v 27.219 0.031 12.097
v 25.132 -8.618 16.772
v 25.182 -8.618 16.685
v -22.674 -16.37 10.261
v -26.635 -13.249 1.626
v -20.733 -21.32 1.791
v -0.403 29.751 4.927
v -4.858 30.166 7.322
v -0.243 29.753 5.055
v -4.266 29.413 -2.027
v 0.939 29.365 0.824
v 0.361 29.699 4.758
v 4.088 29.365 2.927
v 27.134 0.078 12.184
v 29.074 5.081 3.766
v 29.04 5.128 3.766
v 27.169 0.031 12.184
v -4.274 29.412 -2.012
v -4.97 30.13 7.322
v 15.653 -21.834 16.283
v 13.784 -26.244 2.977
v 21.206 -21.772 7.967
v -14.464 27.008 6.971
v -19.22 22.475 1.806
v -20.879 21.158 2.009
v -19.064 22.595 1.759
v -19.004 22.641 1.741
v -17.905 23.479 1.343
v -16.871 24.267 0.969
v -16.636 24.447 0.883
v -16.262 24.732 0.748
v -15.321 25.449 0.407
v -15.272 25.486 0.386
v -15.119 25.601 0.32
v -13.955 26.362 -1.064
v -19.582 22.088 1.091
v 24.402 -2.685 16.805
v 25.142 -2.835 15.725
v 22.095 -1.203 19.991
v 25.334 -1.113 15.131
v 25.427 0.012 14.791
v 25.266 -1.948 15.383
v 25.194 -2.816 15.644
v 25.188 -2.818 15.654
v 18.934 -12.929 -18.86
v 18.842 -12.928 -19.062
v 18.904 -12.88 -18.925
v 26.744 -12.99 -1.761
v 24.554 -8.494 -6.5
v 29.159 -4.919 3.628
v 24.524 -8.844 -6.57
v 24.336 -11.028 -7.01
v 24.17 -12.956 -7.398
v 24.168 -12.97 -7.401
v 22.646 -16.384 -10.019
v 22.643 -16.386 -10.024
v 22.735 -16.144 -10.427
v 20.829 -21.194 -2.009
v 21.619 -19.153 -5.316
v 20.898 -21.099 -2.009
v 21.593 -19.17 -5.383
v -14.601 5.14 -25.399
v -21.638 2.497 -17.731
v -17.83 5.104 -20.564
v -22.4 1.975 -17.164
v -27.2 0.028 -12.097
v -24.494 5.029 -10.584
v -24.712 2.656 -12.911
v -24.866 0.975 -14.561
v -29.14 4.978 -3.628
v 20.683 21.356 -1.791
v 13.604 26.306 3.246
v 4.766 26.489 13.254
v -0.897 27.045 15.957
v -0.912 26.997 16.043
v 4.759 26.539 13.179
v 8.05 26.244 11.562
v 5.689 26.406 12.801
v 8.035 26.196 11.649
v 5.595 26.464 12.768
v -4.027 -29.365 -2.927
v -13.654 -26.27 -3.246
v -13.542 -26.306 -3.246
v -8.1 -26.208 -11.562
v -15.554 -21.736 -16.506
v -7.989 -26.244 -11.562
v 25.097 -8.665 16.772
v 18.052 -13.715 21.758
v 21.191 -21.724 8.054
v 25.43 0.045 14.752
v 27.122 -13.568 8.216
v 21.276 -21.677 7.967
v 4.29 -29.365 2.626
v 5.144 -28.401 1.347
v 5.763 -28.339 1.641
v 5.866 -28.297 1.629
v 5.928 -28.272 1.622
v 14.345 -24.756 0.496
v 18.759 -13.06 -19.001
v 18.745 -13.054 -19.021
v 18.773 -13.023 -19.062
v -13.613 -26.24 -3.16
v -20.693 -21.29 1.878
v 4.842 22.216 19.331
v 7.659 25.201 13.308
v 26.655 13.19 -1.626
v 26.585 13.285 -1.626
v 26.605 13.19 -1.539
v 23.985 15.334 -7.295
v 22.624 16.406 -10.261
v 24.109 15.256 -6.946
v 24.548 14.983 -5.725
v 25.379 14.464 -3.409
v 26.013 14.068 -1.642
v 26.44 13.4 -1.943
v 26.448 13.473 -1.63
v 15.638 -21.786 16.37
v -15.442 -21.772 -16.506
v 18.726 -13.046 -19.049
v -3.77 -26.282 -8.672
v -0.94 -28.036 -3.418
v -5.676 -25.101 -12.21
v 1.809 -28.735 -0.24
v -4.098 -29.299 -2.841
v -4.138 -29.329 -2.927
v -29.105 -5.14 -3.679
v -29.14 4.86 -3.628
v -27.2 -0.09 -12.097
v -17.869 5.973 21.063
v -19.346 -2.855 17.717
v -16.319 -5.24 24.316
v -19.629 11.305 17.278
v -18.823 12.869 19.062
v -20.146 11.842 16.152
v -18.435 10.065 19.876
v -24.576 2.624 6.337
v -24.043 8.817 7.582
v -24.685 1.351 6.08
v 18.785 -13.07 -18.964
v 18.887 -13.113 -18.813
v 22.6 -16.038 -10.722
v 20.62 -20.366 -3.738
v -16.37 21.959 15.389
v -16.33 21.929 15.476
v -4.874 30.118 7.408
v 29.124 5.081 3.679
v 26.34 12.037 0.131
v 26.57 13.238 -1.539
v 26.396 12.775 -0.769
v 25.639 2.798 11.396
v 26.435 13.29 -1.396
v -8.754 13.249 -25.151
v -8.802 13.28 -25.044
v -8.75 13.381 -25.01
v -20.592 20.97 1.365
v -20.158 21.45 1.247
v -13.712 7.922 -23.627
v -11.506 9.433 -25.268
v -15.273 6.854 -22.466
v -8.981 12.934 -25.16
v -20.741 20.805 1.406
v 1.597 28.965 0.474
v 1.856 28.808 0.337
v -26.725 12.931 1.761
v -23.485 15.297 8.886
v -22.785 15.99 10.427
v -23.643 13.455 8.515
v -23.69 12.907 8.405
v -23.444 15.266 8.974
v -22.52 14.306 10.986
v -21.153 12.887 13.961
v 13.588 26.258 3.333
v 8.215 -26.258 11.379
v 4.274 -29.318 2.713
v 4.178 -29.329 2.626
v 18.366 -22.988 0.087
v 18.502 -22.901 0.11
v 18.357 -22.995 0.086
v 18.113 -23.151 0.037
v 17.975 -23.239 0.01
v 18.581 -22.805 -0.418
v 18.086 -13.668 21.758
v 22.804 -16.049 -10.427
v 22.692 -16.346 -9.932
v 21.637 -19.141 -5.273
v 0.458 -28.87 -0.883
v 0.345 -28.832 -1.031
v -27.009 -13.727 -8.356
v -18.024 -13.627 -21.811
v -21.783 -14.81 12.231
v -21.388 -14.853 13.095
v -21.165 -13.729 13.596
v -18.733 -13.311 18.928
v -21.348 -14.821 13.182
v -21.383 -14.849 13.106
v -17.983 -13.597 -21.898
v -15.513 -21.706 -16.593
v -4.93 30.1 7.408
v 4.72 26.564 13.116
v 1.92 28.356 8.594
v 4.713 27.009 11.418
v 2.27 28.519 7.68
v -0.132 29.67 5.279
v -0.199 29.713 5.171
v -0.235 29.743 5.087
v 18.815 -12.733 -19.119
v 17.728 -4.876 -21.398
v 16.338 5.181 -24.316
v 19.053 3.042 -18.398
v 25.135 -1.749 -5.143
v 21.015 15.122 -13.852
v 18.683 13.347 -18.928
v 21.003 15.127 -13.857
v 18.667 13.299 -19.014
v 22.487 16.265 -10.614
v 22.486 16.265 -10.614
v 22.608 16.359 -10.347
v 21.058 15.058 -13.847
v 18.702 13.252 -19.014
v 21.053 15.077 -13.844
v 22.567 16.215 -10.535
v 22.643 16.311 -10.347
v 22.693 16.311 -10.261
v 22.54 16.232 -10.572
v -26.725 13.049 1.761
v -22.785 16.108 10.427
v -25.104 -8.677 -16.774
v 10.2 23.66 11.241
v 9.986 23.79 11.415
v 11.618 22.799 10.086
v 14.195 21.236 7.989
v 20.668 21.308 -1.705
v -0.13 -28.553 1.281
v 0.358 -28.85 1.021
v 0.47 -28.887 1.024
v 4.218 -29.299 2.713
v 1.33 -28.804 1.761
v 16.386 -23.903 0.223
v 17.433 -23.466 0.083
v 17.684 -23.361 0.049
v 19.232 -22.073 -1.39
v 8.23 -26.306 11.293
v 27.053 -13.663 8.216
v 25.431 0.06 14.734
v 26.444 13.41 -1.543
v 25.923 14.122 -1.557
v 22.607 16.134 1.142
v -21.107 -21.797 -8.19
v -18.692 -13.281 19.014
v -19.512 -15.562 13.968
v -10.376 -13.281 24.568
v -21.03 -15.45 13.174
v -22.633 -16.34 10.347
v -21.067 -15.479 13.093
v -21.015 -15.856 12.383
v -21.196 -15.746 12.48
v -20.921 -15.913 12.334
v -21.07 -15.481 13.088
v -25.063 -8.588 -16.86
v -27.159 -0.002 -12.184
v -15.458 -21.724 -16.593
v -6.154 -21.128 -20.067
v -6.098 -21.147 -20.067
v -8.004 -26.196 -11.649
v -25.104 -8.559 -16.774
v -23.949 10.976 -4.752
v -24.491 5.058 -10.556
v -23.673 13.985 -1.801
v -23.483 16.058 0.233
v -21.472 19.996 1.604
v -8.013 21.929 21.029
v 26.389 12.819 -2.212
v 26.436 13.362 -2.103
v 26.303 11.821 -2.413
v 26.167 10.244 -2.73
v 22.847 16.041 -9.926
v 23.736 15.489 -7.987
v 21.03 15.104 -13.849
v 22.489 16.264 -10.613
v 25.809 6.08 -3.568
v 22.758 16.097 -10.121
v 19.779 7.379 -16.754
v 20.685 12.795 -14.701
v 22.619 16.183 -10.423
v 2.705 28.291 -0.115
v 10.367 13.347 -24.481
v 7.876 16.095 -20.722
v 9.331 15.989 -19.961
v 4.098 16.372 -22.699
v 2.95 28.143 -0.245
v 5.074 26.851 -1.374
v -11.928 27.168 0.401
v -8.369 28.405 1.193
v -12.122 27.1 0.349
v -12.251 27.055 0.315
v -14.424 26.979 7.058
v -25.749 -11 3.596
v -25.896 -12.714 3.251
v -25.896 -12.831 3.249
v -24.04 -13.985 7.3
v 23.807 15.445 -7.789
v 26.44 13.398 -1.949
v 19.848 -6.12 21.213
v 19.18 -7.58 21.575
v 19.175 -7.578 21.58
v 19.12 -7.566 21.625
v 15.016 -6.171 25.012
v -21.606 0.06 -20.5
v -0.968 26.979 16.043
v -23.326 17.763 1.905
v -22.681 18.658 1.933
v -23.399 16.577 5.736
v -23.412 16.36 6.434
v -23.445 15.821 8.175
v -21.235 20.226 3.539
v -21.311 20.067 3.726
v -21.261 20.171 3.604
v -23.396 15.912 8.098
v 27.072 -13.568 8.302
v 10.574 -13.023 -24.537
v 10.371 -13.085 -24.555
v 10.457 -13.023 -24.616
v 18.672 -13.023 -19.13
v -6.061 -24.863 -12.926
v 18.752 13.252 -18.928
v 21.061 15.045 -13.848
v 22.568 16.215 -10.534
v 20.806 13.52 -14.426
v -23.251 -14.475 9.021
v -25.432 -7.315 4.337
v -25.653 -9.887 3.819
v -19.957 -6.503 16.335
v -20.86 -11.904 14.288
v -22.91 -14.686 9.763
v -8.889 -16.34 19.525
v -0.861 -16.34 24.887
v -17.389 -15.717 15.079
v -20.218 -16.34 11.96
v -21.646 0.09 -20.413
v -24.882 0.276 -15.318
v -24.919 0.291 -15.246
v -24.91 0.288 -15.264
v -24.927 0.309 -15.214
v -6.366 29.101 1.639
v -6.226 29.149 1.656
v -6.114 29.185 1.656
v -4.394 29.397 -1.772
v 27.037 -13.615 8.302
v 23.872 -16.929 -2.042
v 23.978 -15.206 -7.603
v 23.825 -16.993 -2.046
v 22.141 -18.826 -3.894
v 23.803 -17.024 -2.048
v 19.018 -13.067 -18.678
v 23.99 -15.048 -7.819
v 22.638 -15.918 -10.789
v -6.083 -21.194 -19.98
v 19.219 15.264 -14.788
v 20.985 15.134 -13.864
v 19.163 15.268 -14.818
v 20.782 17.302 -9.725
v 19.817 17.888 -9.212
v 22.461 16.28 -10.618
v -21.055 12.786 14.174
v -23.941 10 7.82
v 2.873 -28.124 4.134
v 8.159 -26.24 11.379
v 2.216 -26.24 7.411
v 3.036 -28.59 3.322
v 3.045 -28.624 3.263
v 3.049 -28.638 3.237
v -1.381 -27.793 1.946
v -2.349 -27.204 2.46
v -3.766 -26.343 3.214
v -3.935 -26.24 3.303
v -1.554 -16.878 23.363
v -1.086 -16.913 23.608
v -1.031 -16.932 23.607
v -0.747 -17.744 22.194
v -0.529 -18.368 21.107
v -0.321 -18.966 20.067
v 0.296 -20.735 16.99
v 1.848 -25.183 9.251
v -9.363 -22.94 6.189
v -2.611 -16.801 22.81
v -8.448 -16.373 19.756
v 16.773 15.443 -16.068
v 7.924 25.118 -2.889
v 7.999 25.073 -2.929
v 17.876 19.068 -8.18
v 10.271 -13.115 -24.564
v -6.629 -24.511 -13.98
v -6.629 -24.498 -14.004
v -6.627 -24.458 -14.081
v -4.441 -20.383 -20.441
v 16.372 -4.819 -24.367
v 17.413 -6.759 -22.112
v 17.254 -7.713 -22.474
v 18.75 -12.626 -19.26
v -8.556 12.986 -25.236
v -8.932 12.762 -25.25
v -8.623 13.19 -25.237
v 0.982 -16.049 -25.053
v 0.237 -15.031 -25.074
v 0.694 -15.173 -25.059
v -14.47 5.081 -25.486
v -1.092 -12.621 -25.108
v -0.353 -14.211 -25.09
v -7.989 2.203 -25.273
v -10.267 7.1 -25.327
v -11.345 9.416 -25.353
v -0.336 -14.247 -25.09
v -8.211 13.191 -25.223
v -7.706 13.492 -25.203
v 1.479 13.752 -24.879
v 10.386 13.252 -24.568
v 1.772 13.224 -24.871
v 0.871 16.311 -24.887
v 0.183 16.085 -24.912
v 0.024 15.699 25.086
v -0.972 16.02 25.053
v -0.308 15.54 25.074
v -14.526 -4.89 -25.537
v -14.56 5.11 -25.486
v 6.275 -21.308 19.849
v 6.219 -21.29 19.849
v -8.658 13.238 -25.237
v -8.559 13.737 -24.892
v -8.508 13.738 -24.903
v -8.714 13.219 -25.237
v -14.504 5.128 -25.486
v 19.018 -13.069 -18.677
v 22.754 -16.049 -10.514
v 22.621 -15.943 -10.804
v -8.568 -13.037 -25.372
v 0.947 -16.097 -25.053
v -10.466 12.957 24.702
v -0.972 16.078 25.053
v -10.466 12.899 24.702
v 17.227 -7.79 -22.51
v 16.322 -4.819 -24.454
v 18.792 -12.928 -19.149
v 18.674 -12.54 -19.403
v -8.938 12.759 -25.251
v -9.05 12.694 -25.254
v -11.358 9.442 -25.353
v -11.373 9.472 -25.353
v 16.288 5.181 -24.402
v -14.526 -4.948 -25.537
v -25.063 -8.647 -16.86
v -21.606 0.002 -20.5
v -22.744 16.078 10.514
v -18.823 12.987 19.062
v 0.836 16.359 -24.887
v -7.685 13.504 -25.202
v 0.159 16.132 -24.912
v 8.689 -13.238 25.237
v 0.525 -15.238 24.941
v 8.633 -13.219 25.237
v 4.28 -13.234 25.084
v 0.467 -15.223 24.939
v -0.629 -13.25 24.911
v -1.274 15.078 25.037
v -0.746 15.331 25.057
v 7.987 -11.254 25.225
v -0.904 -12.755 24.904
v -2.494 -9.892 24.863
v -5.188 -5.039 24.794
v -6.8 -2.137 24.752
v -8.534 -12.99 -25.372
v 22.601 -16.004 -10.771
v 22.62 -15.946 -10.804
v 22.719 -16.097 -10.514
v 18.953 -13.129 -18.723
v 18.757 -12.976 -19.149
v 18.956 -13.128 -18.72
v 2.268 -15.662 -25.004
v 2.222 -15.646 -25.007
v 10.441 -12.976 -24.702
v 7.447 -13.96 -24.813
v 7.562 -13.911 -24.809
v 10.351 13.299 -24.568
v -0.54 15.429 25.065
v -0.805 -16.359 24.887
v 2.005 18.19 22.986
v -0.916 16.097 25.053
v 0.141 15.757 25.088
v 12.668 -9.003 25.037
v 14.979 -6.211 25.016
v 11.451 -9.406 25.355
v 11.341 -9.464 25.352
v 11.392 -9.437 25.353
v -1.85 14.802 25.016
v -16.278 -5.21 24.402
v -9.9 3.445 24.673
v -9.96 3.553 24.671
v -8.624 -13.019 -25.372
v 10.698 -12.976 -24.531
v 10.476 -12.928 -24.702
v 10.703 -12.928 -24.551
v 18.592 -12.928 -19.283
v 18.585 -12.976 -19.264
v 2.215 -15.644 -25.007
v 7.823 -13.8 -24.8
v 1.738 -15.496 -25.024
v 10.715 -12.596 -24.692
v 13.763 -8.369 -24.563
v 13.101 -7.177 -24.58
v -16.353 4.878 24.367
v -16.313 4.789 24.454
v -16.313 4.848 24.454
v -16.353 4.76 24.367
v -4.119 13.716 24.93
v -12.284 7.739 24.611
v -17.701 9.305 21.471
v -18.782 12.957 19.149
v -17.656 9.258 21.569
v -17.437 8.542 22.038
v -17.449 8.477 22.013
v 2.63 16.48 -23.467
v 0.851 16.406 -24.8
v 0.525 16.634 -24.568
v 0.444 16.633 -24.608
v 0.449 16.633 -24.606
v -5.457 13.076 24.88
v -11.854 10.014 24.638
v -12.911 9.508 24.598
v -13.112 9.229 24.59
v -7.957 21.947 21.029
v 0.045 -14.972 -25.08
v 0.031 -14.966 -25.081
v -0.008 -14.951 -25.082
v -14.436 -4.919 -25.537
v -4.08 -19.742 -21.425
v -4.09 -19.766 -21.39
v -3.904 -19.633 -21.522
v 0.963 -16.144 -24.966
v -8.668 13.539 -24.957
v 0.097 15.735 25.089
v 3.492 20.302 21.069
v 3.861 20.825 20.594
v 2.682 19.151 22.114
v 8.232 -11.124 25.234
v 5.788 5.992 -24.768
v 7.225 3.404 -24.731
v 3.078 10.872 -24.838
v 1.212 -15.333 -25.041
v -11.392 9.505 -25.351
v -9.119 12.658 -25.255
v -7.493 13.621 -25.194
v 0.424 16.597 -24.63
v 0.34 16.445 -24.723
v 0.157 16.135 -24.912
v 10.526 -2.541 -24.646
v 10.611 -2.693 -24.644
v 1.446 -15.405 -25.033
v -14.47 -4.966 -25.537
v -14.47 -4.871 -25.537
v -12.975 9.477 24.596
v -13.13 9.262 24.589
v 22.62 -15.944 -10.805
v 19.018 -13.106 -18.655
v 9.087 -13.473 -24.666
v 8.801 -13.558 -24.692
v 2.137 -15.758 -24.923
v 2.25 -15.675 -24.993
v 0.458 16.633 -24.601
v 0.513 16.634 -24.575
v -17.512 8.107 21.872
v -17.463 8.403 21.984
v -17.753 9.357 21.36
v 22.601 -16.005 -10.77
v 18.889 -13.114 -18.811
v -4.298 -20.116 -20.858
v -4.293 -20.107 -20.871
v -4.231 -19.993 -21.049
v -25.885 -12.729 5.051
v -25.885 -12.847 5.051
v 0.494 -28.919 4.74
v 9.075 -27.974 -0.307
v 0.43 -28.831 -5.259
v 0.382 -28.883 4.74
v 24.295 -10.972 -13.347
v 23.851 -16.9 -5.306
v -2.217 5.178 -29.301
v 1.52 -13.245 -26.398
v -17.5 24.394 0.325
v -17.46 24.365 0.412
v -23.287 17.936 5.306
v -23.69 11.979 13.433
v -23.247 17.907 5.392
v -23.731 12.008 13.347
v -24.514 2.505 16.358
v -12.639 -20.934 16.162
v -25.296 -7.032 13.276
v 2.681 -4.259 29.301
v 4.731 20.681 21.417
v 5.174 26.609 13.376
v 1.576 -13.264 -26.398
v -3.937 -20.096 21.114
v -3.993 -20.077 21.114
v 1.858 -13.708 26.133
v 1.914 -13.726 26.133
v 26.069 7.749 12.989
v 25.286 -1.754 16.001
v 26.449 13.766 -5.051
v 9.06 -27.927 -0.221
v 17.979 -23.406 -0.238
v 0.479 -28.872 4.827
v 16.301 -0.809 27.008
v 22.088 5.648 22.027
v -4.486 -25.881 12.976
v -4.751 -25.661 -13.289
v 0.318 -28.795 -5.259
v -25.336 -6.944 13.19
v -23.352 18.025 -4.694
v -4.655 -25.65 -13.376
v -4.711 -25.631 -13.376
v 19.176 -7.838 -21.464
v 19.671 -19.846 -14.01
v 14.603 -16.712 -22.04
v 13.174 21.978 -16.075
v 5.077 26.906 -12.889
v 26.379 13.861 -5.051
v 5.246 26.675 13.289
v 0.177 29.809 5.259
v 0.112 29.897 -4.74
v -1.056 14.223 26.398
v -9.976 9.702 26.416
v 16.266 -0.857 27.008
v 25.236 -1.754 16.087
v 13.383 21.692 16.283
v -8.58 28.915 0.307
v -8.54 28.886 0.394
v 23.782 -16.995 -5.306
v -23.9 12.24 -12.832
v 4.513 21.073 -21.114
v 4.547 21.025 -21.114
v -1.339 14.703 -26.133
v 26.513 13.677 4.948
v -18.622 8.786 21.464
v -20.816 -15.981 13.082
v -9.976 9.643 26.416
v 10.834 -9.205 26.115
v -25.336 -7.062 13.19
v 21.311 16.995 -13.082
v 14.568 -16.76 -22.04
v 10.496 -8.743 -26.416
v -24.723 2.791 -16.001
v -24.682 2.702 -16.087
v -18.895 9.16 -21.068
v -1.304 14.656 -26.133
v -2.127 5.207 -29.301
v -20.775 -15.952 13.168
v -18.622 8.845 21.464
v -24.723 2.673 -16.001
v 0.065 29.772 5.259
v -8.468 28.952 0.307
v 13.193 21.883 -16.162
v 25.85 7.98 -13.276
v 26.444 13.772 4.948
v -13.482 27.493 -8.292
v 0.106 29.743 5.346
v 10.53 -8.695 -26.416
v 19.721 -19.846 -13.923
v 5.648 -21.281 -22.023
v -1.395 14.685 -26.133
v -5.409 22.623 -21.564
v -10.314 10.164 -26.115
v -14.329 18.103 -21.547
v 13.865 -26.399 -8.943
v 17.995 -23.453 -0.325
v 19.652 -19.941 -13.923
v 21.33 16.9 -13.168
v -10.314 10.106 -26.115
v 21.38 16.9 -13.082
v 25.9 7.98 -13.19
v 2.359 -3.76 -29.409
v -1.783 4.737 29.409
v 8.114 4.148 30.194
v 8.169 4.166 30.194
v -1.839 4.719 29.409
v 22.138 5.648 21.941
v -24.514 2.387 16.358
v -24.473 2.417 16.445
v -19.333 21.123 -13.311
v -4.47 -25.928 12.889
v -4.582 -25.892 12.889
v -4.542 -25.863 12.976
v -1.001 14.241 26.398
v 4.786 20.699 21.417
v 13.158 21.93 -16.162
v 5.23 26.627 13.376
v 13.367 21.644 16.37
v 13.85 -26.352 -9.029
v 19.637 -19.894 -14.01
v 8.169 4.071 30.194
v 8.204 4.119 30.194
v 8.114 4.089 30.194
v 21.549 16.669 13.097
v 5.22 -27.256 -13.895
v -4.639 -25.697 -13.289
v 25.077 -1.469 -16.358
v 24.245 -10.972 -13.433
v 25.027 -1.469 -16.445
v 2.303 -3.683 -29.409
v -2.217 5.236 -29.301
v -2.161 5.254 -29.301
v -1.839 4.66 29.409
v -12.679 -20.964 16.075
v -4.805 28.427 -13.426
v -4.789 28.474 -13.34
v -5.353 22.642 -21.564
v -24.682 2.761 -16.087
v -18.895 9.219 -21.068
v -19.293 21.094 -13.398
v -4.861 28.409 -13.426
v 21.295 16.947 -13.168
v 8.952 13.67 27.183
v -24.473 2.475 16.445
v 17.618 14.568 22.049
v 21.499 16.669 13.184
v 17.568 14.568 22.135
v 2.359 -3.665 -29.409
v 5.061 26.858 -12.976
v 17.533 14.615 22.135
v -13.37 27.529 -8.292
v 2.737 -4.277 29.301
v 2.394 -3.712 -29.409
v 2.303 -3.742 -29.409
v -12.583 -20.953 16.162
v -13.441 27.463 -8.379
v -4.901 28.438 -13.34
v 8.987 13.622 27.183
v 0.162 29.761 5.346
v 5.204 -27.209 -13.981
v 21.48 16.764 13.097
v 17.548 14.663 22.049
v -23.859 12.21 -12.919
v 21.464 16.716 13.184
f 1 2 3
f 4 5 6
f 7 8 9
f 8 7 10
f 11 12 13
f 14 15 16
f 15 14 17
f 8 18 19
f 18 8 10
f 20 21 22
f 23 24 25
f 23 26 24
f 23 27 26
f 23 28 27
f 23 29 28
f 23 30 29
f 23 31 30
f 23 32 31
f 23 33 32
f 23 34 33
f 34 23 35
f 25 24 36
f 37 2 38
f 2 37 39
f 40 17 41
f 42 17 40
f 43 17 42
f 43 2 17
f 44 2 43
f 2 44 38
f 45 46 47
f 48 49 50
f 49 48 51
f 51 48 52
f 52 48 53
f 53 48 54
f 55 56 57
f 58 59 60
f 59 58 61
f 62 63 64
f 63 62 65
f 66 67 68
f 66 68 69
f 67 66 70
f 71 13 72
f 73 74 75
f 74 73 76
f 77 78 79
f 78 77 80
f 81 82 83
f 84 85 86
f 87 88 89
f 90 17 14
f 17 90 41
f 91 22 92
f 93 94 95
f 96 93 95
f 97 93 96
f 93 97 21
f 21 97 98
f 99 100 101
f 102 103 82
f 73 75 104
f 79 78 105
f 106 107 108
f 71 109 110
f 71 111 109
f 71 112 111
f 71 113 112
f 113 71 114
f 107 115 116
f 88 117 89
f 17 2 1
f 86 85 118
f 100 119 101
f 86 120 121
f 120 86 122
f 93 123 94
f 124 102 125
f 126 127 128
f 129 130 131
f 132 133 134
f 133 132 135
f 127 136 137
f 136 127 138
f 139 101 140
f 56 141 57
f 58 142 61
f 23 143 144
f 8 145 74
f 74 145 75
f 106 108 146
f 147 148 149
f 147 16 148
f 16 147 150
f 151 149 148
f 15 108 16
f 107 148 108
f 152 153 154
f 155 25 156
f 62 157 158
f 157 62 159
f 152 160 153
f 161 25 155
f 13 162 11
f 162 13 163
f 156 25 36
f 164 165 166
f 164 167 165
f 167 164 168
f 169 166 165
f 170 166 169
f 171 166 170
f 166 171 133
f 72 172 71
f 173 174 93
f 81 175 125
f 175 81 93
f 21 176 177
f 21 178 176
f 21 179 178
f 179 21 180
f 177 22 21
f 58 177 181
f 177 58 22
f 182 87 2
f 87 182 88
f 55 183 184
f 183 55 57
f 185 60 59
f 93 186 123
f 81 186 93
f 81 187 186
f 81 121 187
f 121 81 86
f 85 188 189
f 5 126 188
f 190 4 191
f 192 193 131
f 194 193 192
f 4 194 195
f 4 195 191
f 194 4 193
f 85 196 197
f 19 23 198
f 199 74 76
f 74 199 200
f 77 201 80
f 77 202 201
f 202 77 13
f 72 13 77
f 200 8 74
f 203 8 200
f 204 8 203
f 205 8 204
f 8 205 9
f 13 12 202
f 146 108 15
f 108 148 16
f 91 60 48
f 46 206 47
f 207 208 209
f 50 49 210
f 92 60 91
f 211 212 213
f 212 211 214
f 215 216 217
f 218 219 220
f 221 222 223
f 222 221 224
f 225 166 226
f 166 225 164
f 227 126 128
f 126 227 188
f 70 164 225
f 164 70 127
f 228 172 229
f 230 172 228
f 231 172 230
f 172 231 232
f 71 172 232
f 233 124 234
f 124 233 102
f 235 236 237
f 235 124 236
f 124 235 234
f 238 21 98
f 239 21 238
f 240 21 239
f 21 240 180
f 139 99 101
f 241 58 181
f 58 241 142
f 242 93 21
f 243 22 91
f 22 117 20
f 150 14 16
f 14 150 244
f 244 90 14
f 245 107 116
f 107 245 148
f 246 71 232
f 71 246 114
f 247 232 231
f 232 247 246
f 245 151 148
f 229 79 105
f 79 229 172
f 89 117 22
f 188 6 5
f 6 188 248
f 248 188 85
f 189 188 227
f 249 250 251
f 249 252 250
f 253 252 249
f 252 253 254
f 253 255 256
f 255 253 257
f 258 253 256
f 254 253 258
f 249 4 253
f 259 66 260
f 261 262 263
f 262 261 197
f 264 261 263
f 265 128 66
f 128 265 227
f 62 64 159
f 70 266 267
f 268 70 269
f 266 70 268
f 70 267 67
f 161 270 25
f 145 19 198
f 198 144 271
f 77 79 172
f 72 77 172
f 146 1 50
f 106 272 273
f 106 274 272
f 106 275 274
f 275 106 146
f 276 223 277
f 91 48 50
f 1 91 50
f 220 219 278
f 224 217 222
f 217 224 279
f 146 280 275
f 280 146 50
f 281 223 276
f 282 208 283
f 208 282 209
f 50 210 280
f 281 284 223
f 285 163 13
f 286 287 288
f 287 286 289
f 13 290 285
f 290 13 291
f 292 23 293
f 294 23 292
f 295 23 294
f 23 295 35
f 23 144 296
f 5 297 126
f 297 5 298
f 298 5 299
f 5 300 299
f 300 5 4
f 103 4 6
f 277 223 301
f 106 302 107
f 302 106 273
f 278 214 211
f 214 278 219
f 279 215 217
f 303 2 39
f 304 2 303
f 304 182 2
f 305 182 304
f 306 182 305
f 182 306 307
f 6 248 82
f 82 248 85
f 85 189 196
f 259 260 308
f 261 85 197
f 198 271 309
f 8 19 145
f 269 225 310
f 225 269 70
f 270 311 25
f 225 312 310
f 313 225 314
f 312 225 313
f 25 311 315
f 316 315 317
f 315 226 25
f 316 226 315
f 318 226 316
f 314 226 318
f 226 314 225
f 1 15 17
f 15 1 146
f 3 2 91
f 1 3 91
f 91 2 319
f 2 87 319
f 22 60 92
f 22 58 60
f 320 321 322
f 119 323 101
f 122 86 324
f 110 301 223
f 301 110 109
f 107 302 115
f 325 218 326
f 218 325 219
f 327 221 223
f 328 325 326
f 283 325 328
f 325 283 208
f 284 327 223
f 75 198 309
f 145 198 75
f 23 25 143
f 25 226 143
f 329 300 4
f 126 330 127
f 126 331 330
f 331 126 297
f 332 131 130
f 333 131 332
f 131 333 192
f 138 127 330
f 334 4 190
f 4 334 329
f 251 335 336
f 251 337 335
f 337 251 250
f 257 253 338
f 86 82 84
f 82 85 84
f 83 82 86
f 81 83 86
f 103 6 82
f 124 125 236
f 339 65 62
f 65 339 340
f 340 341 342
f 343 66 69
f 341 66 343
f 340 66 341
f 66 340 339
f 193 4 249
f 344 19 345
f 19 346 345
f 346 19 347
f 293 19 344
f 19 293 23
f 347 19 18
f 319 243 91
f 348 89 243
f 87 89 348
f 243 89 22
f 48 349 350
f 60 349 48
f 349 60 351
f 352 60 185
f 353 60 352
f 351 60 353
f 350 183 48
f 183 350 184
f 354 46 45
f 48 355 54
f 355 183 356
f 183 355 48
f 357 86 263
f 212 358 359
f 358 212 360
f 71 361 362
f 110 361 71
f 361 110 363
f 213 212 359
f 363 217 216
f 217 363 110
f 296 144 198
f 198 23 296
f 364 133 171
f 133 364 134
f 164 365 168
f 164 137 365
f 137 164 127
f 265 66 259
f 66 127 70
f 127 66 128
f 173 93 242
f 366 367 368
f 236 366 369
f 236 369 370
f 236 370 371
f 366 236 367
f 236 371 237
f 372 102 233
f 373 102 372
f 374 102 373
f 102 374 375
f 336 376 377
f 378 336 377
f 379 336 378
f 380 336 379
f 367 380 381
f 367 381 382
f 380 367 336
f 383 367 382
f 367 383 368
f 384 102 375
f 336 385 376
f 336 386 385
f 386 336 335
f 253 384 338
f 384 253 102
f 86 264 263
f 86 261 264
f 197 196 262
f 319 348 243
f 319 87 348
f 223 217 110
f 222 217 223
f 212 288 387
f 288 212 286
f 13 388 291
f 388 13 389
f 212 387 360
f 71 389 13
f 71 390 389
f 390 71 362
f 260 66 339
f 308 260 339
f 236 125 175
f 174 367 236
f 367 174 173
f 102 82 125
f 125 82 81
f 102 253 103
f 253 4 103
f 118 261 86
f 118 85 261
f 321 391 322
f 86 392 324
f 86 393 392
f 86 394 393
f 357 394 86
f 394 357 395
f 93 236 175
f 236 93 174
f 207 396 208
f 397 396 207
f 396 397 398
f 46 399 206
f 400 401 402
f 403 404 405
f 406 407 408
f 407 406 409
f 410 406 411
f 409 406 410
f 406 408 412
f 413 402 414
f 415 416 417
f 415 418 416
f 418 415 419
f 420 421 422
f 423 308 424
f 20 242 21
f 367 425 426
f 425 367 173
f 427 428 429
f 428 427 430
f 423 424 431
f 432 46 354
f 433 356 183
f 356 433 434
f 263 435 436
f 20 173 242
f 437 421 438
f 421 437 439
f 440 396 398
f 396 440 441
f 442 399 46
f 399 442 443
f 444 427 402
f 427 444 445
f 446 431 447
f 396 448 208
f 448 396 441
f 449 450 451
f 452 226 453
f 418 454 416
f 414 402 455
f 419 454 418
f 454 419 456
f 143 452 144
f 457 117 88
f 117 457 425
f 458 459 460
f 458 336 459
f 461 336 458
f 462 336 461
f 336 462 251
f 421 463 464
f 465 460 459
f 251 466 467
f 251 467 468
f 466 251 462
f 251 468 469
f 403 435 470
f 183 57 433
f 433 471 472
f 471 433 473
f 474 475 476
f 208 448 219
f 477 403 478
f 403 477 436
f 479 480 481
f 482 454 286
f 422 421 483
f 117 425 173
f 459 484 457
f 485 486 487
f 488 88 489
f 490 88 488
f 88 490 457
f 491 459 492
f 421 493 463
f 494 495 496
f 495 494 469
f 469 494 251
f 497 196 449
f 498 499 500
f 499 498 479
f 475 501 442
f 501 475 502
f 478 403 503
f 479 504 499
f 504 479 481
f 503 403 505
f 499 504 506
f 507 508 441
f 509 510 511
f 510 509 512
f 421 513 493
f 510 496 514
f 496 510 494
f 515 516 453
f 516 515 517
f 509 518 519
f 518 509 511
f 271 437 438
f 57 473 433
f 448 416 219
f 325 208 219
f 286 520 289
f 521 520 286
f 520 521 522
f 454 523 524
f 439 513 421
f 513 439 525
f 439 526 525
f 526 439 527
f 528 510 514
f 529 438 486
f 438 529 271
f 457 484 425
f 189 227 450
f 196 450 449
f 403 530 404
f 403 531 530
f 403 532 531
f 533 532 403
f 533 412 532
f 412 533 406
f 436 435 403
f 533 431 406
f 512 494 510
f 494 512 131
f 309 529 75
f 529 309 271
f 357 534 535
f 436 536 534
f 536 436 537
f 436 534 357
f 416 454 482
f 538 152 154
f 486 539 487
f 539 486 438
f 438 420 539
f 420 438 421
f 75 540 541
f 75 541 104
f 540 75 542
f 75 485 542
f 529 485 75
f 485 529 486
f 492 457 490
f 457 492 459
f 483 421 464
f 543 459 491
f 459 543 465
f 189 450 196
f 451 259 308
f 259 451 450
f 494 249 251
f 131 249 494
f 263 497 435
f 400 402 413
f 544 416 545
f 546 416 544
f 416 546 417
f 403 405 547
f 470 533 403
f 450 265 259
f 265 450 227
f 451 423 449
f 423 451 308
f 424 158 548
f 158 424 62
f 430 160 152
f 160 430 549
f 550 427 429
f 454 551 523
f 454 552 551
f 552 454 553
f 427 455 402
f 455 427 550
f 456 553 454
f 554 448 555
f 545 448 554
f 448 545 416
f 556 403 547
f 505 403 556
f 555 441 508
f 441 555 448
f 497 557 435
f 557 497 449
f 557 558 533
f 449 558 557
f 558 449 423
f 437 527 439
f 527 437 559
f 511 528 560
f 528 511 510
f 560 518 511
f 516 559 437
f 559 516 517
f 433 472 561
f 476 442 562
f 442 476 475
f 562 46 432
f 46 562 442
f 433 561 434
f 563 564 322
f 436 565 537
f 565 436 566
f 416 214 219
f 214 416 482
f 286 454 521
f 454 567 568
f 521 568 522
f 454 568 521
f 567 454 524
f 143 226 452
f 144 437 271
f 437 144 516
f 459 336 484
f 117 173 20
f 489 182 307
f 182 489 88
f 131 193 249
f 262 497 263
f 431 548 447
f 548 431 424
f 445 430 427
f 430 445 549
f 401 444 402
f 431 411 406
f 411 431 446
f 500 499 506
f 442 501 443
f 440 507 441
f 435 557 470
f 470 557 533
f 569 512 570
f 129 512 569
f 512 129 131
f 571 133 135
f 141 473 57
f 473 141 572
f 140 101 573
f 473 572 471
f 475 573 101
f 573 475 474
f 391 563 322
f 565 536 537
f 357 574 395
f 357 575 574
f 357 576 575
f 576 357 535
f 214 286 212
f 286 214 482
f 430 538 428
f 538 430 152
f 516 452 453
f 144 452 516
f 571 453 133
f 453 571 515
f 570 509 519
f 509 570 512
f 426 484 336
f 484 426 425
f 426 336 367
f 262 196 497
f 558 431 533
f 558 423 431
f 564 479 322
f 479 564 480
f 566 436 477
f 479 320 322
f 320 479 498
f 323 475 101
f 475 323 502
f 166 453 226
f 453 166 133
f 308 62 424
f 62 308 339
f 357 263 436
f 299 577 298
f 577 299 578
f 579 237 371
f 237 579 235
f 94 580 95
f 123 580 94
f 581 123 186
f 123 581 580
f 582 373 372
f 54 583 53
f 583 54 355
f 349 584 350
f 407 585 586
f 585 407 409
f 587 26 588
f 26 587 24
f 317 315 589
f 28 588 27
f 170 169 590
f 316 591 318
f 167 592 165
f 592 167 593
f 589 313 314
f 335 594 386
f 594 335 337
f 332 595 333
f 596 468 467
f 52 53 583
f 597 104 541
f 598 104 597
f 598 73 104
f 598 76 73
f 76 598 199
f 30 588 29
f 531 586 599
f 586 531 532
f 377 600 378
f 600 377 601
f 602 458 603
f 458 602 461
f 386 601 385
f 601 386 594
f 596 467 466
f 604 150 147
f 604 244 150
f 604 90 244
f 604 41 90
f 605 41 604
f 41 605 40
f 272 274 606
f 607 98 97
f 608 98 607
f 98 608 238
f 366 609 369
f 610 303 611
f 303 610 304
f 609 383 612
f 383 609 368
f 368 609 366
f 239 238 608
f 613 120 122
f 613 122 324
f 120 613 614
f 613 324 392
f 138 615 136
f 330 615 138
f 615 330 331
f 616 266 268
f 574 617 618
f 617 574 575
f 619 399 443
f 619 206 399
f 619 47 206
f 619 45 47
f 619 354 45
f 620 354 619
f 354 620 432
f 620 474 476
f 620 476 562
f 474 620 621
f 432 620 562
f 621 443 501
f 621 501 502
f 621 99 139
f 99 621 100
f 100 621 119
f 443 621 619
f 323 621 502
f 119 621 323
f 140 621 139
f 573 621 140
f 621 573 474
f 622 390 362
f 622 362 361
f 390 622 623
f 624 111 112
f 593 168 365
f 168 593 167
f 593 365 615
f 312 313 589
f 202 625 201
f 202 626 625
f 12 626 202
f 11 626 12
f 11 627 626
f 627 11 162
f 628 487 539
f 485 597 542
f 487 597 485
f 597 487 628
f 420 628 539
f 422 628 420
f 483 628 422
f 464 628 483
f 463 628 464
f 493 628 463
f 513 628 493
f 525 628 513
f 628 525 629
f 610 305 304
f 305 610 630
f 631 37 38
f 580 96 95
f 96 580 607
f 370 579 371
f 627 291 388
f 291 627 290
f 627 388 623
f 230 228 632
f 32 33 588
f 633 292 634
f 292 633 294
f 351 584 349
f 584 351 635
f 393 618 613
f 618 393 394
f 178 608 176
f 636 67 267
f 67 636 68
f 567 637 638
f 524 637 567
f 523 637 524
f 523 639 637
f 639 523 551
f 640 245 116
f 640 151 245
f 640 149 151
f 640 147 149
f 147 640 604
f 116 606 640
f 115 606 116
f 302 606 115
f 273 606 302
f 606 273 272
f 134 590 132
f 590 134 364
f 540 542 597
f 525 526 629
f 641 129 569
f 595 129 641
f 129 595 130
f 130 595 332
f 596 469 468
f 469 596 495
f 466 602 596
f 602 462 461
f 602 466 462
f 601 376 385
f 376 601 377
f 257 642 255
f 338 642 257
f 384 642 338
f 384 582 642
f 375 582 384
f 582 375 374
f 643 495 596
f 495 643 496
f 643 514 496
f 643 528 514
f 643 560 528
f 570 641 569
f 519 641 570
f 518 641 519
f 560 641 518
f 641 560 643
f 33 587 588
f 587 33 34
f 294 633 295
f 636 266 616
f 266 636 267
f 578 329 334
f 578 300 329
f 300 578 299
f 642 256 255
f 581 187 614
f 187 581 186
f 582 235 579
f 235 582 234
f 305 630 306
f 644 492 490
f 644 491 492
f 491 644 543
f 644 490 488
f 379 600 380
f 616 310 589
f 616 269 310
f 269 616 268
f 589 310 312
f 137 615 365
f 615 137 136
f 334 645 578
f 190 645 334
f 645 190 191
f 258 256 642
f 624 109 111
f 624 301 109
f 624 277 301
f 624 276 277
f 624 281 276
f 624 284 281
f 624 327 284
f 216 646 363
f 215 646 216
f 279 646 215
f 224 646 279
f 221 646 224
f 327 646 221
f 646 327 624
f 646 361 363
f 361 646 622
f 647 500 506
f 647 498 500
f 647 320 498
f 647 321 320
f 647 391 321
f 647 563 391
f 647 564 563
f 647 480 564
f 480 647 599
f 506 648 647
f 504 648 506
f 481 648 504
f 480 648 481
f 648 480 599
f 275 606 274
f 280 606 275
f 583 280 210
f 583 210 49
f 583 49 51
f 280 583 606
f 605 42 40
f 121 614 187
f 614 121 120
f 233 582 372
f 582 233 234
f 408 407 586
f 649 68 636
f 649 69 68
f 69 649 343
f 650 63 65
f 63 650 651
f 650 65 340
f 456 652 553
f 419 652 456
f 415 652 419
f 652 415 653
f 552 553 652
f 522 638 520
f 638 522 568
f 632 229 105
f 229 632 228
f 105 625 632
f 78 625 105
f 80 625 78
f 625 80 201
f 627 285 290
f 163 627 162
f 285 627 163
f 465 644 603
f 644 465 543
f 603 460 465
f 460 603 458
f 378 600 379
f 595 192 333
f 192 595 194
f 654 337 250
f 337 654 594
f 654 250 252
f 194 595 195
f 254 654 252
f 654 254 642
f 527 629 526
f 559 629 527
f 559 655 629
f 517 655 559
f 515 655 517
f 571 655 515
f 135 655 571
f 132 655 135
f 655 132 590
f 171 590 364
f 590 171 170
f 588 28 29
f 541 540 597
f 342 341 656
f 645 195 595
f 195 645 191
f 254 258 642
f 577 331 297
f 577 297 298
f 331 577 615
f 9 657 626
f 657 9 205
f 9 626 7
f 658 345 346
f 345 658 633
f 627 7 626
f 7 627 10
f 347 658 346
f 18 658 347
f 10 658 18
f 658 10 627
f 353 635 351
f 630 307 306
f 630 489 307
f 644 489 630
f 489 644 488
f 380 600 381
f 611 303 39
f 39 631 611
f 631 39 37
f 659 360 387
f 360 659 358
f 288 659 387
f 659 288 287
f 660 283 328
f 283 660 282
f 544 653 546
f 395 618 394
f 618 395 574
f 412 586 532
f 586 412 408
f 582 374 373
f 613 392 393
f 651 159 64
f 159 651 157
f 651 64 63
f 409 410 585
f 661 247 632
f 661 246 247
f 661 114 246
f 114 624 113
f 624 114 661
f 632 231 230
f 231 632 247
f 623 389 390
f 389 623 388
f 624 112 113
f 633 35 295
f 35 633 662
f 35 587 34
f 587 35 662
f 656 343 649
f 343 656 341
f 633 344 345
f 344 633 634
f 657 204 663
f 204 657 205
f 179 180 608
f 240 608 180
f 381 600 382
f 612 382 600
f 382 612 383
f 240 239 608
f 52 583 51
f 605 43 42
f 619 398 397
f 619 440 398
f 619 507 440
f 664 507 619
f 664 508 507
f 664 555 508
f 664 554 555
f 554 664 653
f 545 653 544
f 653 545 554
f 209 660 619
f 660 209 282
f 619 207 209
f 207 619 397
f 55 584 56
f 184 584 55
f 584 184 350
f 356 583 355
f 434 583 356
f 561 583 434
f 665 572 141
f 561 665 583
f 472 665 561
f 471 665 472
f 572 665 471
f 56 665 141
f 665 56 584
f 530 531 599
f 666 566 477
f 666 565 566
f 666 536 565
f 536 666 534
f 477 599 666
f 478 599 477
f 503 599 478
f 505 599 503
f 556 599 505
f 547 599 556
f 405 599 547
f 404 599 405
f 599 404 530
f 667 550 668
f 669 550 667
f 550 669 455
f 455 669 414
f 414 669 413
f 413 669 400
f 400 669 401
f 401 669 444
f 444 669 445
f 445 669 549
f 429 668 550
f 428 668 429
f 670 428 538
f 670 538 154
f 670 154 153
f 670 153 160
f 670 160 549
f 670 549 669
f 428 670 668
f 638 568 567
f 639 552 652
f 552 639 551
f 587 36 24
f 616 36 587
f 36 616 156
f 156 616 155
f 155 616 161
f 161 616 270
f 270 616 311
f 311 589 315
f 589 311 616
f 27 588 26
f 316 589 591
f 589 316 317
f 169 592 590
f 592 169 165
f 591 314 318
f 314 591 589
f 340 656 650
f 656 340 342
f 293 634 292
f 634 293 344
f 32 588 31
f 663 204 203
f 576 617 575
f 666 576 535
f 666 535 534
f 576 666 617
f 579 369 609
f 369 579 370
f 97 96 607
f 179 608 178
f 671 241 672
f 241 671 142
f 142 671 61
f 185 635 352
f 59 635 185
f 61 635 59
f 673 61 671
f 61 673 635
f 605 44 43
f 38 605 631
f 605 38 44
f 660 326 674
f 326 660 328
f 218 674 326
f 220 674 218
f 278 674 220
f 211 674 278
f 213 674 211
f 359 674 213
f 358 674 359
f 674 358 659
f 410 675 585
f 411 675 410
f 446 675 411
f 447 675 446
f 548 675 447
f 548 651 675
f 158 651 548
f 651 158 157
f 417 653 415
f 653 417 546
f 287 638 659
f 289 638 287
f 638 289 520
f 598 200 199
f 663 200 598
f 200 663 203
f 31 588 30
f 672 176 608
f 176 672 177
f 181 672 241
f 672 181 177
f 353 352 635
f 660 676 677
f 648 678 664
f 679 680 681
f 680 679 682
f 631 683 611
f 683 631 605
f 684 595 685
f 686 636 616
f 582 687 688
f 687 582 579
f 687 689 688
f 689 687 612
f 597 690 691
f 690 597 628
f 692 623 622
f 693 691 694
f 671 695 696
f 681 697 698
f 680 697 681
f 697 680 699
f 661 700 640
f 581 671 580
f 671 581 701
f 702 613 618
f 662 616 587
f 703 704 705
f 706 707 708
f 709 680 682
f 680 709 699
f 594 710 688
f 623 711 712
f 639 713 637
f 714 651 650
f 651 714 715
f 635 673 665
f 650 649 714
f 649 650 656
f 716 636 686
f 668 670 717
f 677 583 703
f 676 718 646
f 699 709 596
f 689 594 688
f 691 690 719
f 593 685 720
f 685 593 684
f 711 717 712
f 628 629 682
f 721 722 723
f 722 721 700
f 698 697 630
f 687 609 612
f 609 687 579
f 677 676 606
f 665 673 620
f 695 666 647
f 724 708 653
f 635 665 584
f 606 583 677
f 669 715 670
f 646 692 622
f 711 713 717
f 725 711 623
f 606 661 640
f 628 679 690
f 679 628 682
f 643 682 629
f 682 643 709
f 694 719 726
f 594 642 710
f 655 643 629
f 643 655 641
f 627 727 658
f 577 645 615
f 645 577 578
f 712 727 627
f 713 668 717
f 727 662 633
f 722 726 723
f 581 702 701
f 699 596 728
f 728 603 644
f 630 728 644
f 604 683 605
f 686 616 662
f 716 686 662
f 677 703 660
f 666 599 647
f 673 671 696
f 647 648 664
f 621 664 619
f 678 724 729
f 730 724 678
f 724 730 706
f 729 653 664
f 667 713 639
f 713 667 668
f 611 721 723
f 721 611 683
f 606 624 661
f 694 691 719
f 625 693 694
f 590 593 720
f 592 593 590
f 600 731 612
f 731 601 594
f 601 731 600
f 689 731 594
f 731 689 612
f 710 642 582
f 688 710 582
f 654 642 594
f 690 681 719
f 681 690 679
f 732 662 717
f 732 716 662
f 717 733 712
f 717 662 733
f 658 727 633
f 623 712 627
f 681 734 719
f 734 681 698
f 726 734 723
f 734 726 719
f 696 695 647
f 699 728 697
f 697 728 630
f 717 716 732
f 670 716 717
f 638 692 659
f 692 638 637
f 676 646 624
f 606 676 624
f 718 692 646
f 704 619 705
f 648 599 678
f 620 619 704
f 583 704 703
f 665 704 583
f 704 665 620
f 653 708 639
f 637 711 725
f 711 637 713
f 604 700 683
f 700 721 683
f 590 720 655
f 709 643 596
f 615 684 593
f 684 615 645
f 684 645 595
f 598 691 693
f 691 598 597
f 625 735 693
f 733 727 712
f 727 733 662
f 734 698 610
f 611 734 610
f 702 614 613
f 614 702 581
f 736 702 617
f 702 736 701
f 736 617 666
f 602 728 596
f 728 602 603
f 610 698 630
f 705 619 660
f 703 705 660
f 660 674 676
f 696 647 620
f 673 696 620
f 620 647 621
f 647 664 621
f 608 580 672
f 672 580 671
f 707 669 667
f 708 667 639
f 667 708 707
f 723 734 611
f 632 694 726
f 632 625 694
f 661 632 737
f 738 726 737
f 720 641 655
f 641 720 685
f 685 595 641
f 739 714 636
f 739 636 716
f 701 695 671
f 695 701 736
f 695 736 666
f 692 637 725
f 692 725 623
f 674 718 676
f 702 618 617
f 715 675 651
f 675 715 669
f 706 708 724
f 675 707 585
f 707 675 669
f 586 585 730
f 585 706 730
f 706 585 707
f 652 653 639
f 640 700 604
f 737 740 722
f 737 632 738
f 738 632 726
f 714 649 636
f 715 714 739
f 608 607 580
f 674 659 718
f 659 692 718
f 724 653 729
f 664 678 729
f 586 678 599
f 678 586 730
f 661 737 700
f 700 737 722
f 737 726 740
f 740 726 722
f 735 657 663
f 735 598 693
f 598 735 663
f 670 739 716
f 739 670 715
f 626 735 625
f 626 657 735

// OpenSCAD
// Auto-generated OpenSCAD file

    inner_points = 10*[[2.5800168516054605, 0.7980470298110209, -1.3189669327443228], [-2.4432744118438516, 0.24459871431141972, 1.6358172684915129], [2.4977459589942073, -0.14685368717772146, -1.6358172684915129], [-2.525545304455105, -0.7003020026773228, 1.3189669327443228], [-1.0273929293488884, 1.013504771559999, -2.6028581143850014], [-1.8854735183802727, 0.9189645126628418, -2.098120715161195], [1.9399450655306283, -0.8212194855291437, 2.098120715161195], [1.081864476499244, -0.9157597444263008, 2.6028581143850014], [0.014605949080104583, 2.9713492457347006, 0.5259255605908952], [-0.4670162451205472, -2.5601958994998366, -1.3289486129136048], [0.521487792270903, 2.657940926633535, 1.3289486129136048], [0.03986559807025124, -2.873604218601002, -0.5259255605908952], [2.1279729957209983, 1.6899773807507408, -1.3081687185560238], [-2.3649952986203884, 1.194958158554797, 1.3346706145662746], [1.9125850025799456, -0.7838048123199333, -2.137693666888984], [-2.5803832917614407, -1.2788240345158768, 0.5051456662333142], [2.6348548389117963, 1.376569061649575, -0.5051456662333142], [-1.85811345542959, 0.8815498394536314, 2.137693666888984], [2.419466845770744, -1.0972131314210989, -1.3346706145662746], [-2.0735014485706427, -1.5922323536170426, 1.3081687185560238], [-0.13542060028755343, 1.465591309374031, -2.6046263101375176], [-2.3819047474582464, 1.218081698276059, -1.2832066435763685], [-0.21769149289880618, 0.5206905923852883, -2.921476645884708], [-2.464175640069499, 0.27318098128731644, -1.600056979323559], [2.518647187219855, -0.17543595415361818, 1.600056979323559], [0.27216304004916203, -0.42294556525159, 2.921476645884708], [2.436376294608602, -1.1203366711423608, 1.2832066435763685], [0.18989214743790928, -1.3678462822403328, 2.6046263101375176], [0.008147114355070081, 2.980181651968014, -0.47401457364421196], [-0.8499334746763137, 2.8856413930708573, 0.03072282557959416], [-0.4226288719270348, -1.967382734173334, -2.1330644703101322], [-1.2807094609584186, -2.0619229930704908, -1.6283270710863262], [1.3351810081087743, 2.1596680202041894, 1.6283270710863262], [0.47710041907739065, 2.0651277613070325, 2.1330644703101322], [0.9044050218266696, -2.7878963659371587, -0.03072282557959416], [0.04632443279528574, -2.8824366248343156, 0.47401457364421196], [1.3142797798831267, 2.1882502871800864, -1.6075471767287453], [-2.320607925426876, 1.7877713238812996, 0.5305547571697469], [1.0480455788235277, -0.8695126649837768, -2.632896401900285], [-2.5868421264864754, -1.2699916282825632, -0.49479446800179294], [2.641313673636831, 1.3677366554162613, 0.49479446800179294], [-0.9935740316731719, 0.9672576921174749, 2.632896401900285], [2.3750794725772315, -1.6900262967476014, -0.5305547571697469], [-1.259808232732771, -2.090505260046388, 1.6075471767287453], [0.4497403561267084, 2.1025424345162427, -2.1027499117400468], [-2.3270667601519106, 1.796603730114613, -0.4693853770653609], [0.23435236298565587, -0.37123975855443125, -2.932274860073007], [-2.542454753292963, -0.677178462956061, -1.298910325398321], [2.5969263004433185, 0.7749234900897591, 1.298910325398321], [-0.17988081583530008, 0.4689847856881295, 2.932274860073007], [2.3815383073022662, -1.6988587029809148, 0.4693853770653609], [-0.3952688089763525, -2.004797407382544, 2.1027499117400468], [0.5045783434330445, 2.681064466354797, -1.2889286452290385], [-1.7419058037376494, 2.4335548552568254, 0.03249102133211079], [0.1560732497621926, -1.321599202797809, -2.6311282061477685], [-2.090410897408501, -1.569108813895781, -1.3097085395866195], [2.144882444558857, 1.666853841029479, 1.3097085395866195], [-0.10160170261183678, 1.419344229931507, 2.6311282061477685], [1.796377350888005, -2.3358098281231268, -0.03249102133211079], [-0.4501067962826887, -2.5833194392210985, 1.2889286452290385], [-0.5368524378149407, 2.2594080955840976, -2.1477812710372692], [-1.9252559959542506, 2.1064387433832827, -1.3310990036999262], [2.2038011054775724, 0.5648442997397853, 2.1940747320103373], [0.8153975473382632, 0.4118749475389705, 3.0107569993476804], [0.5632820446898252, -2.1233159333049074, -2.1935995998160314], [1.3834340952527309, -2.630421245967566, -0.8942810074082022], [-0.4820144505086047, 2.8379301274226516, -1.3339600045262612], [-1.3400950395399884, 2.7433898685254943, -0.8292226053024551], [1.7517572495931102, 1.456774650679505, 2.204872946198636], [0.8936766605617265, 1.3622343917823476, 2.7096103454224423], [1.4552543737511603, -1.6712293954908752, -2.1953677955685476], [1.9621362169419587, -1.984637714592041, -1.3923447432458382], [-1.428824766876276, 1.807321557770065, -2.1460130752847526], [1.6250989837883454, -0.08093923163574031, 2.6921384678479736], [0.5188946714963129, -2.7161290986314097, -1.3894837424195032]];

    outer_points = 10*[[-1.6237729602140323, -0.5180972863871907, 2.431576450233078], [1.6272083434635762, -0.4818835798868834, -2.4367208868087524], [-1.6272083434635762, 0.4818835798868834, 2.4367208868087524], [1.6237729602140323, 0.5180972863871907, -2.431576450233078], [-2.71186219611676, -0.003093019792710145, -1.2097195213409813], [-2.156528291374358, 0.003093019792710145, -2.0413239869120874], [2.156528291374358, -0.003093019792710145, 2.0413239869120874], [2.71186219611676, 0.003093019792710145, 1.2097195213409813], [-0.40575464686575385, -2.92699497773356, -0.29273029341267365], [-0.425865730701731, 2.92699497773356, -0.26261423713977006], [0.425865730701731, -2.92699497773356, 0.26261423713977006], [0.40575464686575385, 2.92699497773356, 0.29273029341267365], [-1.8651962514487022, -1.3251872098929274, 1.8927623358810832], [1.0425698239929058, -1.292796686112162, -2.4615751762416114], [-1.8741902015603906, 1.292796686112162, 1.9062306456891678], [1.0335758738812173, 1.3251872098929274, -2.448106866433527], [-1.0335758738812173, -1.3251872098929274, 2.448106866433527], [1.8741902015603906, -1.292796686112162, -1.9062306456891678], [-1.0425698239929058, 1.292796686112162, 2.4615751762416114], [1.8651962514487022, 1.3251872098929274, -1.8927623358810832], [-2.902434241444326, -0.5080880640822284, -0.3678986967098157], [-1.4485512037235218, -0.4918928021918457, -2.545067452771163], [-2.90586962469387, 0.4918928021918457, -0.36275426013414114], [-1.451986586973066, 0.5080880640822284, -2.5399230161954884], [1.451986586973066, -0.5080880640822284, 2.5399230161954884], [2.90586962469387, -0.4918928021918457, 0.36275426013414114], [1.4485512037235218, 0.4918928021918457, 2.545067452771163], [2.902434241444326, 0.5080880640822284, 0.3678986967098157], [-1.3572782093638605, -2.6210769157977993, -0.3246215052488573], [-0.8019443046214587, -2.6148908762123795, -1.1562259708199636], [-1.3752661095872372, 2.6148908762123795, -0.2976848856326887], [-0.8199322048448355, 2.6210769157977993, -1.129289351203795], [0.8199322048448355, -2.6210769157977993, 1.129289351203795], [1.3752661095872372, -2.6148908762123795, 0.2976848856326887], [0.8019443046214587, 2.6148908762123795, 1.1562259708199636], [1.3572782093638605, 2.6210769157977993, 0.3246215052488573], [-2.2592627255918067, -1.631105271828688, 1.026087221817059], [0.09316944510739966, -1.604900787633343, -2.49664582473453], [-2.2703798593160958, 1.604900787633343, 1.042734968281878], [0.08205231138311109, 1.631105271828688, -2.4799980782697113], [-0.08205231138311109, -1.631105271828688, 2.4799980782697113], [2.2703798593160958, -1.604900787633343, -1.042734968281878], [-0.09316944510739966, 1.604900787633343, 2.49664582473453], [2.2592627255918067, 1.631105271828688, -1.026087221817059], [-2.655452383347512, -1.319001170307507, 0.16259154440976942], [-0.8583541173907071, -1.2989827256975823, -2.5285370365707136], [-2.6644463334592, 1.2989827256975823, 0.17605985421785353], [-0.8673480675023955, 1.319001170307507, -2.51506872676263], [0.8673480675023955, -1.319001170307507, 2.51506872676263], [2.6644463334592, -1.2989827256975823, -0.17605985421785353], [0.8583541173907071, 1.2989827256975823, 2.5285370365707136], [2.655452383347512, 1.319001170307507, -0.16259154440976942], [-2.065255297014697, -2.126091093813244, 0.17912196061021834], [-0.6113722592938928, -2.109895831922861, -1.9980467954511292], [-2.0798078139885297, 2.109895831922861, 0.20091414365071247], [-0.6259247762677257, 2.126091093813244, -1.976254612410635], [0.6259247762677257, -2.126091093813244, 1.976254612410635], [2.0798078139885297, -2.109895831922861, -0.20091414365071247], [0.6113722592938928, 2.109895831922861, 1.9980467954511292], [2.065255297014697, 2.126091093813244, -0.17912196061021834], [-2.692835524077599, -1.3667819536544716, -0.8355665079706667], [-1.7942863910991966, -1.3567727313495095, -2.1811307984609085], [1.8036430242705312, -1.3667819536544716, 2.167119376032807], [2.7021921572489336, -1.3567727313495095, 0.8215550855425657], [-1.438337984179842, 2.6949682886817636, 0.6971063219317848], [-0.0927479475386308, 2.6949682886817636, 1.5956726478319931], [-2.102638437744784, -2.173871877160208, -0.8190360917702175], [-1.5473045330023827, -2.1676858375747883, -1.6506405573413236], [1.5622197330358616, -2.173871877160208, 1.628305261680813], [2.117553637778263, -2.1676858375747883, 0.7967007961097068], [-1.628910029507408, 2.1899732443922453, 1.5389271465629506], [-0.7972896519399231, 2.1899732443922453, 2.0942716771153944], [-2.502263478750033, -0.8617869093649534, -1.6773873326018327], [2.5081847286718237, -0.8617869093649534, 1.668520346749406], [-0.4889376052943356, 3.0070723902029446, 0.7321769704247032]];

    // Convex hull for inner set (I)
    module inner_hull() {
        hull() {
            for (p = inner_points) {
                translate(p) sphere(r=0.1);
            }
        }
    }

    // Convex hull for outer set (O) minus inner hull (O \ I)
    module outer_minus_inner() {
        difference() {
            hull() {
                for (p = outer_points) {
                    translate(p) sphere(r=0.1);
                }
            }
            inner_hull(); // Subtract inner hull
        }
    }

    // Convex hull for outer set (O) minus all translated inner hulls
    module outer_minus_AllTranslationInner() {
        difference() {
            hull() {
                for (p = outer_points) {
                    translate(p) sphere(r=0.1);
                }
            }
            hull() {
                translate([0,0,50]) inner_hull();
                translate([0,0,-50]) inner_hull();
            }; // Subtract translated inner hulls
        }
    }

    // Difference between outer_minus_inner and outer_minus_AllTranslationInner
    module outer_minus_inner_diff() {
        difference() {
            // Outer minus inner
            difference() {
                hull() {
                    for (p = outer_points) {
                        translate(p) sphere(r=0.1);
                    }
                }
                inner_hull();
            }

            // Subtract Outer minus AllTranslationInner
            difference() {
                hull() {
                    for (p = outer_points) {
                        translate(p) sphere(r=0.1);
                    }
                }
                hull() {
                    translate([0,0,50]) inner_hull();
                    translate([0,0,-50]) inner_hull();
                };
            }
        }
    }

    // Rendering all with colors applied
    color([1, 0, 0, 0.5]) inner_hull(); // Transparent red
    color([0, 1, 0, 1]) outer_minus_AllTranslationInner(); // Opaque green
    color([1, 1, 0, 1]) outer_minus_inner_diff(); // Opaque yellow
    
